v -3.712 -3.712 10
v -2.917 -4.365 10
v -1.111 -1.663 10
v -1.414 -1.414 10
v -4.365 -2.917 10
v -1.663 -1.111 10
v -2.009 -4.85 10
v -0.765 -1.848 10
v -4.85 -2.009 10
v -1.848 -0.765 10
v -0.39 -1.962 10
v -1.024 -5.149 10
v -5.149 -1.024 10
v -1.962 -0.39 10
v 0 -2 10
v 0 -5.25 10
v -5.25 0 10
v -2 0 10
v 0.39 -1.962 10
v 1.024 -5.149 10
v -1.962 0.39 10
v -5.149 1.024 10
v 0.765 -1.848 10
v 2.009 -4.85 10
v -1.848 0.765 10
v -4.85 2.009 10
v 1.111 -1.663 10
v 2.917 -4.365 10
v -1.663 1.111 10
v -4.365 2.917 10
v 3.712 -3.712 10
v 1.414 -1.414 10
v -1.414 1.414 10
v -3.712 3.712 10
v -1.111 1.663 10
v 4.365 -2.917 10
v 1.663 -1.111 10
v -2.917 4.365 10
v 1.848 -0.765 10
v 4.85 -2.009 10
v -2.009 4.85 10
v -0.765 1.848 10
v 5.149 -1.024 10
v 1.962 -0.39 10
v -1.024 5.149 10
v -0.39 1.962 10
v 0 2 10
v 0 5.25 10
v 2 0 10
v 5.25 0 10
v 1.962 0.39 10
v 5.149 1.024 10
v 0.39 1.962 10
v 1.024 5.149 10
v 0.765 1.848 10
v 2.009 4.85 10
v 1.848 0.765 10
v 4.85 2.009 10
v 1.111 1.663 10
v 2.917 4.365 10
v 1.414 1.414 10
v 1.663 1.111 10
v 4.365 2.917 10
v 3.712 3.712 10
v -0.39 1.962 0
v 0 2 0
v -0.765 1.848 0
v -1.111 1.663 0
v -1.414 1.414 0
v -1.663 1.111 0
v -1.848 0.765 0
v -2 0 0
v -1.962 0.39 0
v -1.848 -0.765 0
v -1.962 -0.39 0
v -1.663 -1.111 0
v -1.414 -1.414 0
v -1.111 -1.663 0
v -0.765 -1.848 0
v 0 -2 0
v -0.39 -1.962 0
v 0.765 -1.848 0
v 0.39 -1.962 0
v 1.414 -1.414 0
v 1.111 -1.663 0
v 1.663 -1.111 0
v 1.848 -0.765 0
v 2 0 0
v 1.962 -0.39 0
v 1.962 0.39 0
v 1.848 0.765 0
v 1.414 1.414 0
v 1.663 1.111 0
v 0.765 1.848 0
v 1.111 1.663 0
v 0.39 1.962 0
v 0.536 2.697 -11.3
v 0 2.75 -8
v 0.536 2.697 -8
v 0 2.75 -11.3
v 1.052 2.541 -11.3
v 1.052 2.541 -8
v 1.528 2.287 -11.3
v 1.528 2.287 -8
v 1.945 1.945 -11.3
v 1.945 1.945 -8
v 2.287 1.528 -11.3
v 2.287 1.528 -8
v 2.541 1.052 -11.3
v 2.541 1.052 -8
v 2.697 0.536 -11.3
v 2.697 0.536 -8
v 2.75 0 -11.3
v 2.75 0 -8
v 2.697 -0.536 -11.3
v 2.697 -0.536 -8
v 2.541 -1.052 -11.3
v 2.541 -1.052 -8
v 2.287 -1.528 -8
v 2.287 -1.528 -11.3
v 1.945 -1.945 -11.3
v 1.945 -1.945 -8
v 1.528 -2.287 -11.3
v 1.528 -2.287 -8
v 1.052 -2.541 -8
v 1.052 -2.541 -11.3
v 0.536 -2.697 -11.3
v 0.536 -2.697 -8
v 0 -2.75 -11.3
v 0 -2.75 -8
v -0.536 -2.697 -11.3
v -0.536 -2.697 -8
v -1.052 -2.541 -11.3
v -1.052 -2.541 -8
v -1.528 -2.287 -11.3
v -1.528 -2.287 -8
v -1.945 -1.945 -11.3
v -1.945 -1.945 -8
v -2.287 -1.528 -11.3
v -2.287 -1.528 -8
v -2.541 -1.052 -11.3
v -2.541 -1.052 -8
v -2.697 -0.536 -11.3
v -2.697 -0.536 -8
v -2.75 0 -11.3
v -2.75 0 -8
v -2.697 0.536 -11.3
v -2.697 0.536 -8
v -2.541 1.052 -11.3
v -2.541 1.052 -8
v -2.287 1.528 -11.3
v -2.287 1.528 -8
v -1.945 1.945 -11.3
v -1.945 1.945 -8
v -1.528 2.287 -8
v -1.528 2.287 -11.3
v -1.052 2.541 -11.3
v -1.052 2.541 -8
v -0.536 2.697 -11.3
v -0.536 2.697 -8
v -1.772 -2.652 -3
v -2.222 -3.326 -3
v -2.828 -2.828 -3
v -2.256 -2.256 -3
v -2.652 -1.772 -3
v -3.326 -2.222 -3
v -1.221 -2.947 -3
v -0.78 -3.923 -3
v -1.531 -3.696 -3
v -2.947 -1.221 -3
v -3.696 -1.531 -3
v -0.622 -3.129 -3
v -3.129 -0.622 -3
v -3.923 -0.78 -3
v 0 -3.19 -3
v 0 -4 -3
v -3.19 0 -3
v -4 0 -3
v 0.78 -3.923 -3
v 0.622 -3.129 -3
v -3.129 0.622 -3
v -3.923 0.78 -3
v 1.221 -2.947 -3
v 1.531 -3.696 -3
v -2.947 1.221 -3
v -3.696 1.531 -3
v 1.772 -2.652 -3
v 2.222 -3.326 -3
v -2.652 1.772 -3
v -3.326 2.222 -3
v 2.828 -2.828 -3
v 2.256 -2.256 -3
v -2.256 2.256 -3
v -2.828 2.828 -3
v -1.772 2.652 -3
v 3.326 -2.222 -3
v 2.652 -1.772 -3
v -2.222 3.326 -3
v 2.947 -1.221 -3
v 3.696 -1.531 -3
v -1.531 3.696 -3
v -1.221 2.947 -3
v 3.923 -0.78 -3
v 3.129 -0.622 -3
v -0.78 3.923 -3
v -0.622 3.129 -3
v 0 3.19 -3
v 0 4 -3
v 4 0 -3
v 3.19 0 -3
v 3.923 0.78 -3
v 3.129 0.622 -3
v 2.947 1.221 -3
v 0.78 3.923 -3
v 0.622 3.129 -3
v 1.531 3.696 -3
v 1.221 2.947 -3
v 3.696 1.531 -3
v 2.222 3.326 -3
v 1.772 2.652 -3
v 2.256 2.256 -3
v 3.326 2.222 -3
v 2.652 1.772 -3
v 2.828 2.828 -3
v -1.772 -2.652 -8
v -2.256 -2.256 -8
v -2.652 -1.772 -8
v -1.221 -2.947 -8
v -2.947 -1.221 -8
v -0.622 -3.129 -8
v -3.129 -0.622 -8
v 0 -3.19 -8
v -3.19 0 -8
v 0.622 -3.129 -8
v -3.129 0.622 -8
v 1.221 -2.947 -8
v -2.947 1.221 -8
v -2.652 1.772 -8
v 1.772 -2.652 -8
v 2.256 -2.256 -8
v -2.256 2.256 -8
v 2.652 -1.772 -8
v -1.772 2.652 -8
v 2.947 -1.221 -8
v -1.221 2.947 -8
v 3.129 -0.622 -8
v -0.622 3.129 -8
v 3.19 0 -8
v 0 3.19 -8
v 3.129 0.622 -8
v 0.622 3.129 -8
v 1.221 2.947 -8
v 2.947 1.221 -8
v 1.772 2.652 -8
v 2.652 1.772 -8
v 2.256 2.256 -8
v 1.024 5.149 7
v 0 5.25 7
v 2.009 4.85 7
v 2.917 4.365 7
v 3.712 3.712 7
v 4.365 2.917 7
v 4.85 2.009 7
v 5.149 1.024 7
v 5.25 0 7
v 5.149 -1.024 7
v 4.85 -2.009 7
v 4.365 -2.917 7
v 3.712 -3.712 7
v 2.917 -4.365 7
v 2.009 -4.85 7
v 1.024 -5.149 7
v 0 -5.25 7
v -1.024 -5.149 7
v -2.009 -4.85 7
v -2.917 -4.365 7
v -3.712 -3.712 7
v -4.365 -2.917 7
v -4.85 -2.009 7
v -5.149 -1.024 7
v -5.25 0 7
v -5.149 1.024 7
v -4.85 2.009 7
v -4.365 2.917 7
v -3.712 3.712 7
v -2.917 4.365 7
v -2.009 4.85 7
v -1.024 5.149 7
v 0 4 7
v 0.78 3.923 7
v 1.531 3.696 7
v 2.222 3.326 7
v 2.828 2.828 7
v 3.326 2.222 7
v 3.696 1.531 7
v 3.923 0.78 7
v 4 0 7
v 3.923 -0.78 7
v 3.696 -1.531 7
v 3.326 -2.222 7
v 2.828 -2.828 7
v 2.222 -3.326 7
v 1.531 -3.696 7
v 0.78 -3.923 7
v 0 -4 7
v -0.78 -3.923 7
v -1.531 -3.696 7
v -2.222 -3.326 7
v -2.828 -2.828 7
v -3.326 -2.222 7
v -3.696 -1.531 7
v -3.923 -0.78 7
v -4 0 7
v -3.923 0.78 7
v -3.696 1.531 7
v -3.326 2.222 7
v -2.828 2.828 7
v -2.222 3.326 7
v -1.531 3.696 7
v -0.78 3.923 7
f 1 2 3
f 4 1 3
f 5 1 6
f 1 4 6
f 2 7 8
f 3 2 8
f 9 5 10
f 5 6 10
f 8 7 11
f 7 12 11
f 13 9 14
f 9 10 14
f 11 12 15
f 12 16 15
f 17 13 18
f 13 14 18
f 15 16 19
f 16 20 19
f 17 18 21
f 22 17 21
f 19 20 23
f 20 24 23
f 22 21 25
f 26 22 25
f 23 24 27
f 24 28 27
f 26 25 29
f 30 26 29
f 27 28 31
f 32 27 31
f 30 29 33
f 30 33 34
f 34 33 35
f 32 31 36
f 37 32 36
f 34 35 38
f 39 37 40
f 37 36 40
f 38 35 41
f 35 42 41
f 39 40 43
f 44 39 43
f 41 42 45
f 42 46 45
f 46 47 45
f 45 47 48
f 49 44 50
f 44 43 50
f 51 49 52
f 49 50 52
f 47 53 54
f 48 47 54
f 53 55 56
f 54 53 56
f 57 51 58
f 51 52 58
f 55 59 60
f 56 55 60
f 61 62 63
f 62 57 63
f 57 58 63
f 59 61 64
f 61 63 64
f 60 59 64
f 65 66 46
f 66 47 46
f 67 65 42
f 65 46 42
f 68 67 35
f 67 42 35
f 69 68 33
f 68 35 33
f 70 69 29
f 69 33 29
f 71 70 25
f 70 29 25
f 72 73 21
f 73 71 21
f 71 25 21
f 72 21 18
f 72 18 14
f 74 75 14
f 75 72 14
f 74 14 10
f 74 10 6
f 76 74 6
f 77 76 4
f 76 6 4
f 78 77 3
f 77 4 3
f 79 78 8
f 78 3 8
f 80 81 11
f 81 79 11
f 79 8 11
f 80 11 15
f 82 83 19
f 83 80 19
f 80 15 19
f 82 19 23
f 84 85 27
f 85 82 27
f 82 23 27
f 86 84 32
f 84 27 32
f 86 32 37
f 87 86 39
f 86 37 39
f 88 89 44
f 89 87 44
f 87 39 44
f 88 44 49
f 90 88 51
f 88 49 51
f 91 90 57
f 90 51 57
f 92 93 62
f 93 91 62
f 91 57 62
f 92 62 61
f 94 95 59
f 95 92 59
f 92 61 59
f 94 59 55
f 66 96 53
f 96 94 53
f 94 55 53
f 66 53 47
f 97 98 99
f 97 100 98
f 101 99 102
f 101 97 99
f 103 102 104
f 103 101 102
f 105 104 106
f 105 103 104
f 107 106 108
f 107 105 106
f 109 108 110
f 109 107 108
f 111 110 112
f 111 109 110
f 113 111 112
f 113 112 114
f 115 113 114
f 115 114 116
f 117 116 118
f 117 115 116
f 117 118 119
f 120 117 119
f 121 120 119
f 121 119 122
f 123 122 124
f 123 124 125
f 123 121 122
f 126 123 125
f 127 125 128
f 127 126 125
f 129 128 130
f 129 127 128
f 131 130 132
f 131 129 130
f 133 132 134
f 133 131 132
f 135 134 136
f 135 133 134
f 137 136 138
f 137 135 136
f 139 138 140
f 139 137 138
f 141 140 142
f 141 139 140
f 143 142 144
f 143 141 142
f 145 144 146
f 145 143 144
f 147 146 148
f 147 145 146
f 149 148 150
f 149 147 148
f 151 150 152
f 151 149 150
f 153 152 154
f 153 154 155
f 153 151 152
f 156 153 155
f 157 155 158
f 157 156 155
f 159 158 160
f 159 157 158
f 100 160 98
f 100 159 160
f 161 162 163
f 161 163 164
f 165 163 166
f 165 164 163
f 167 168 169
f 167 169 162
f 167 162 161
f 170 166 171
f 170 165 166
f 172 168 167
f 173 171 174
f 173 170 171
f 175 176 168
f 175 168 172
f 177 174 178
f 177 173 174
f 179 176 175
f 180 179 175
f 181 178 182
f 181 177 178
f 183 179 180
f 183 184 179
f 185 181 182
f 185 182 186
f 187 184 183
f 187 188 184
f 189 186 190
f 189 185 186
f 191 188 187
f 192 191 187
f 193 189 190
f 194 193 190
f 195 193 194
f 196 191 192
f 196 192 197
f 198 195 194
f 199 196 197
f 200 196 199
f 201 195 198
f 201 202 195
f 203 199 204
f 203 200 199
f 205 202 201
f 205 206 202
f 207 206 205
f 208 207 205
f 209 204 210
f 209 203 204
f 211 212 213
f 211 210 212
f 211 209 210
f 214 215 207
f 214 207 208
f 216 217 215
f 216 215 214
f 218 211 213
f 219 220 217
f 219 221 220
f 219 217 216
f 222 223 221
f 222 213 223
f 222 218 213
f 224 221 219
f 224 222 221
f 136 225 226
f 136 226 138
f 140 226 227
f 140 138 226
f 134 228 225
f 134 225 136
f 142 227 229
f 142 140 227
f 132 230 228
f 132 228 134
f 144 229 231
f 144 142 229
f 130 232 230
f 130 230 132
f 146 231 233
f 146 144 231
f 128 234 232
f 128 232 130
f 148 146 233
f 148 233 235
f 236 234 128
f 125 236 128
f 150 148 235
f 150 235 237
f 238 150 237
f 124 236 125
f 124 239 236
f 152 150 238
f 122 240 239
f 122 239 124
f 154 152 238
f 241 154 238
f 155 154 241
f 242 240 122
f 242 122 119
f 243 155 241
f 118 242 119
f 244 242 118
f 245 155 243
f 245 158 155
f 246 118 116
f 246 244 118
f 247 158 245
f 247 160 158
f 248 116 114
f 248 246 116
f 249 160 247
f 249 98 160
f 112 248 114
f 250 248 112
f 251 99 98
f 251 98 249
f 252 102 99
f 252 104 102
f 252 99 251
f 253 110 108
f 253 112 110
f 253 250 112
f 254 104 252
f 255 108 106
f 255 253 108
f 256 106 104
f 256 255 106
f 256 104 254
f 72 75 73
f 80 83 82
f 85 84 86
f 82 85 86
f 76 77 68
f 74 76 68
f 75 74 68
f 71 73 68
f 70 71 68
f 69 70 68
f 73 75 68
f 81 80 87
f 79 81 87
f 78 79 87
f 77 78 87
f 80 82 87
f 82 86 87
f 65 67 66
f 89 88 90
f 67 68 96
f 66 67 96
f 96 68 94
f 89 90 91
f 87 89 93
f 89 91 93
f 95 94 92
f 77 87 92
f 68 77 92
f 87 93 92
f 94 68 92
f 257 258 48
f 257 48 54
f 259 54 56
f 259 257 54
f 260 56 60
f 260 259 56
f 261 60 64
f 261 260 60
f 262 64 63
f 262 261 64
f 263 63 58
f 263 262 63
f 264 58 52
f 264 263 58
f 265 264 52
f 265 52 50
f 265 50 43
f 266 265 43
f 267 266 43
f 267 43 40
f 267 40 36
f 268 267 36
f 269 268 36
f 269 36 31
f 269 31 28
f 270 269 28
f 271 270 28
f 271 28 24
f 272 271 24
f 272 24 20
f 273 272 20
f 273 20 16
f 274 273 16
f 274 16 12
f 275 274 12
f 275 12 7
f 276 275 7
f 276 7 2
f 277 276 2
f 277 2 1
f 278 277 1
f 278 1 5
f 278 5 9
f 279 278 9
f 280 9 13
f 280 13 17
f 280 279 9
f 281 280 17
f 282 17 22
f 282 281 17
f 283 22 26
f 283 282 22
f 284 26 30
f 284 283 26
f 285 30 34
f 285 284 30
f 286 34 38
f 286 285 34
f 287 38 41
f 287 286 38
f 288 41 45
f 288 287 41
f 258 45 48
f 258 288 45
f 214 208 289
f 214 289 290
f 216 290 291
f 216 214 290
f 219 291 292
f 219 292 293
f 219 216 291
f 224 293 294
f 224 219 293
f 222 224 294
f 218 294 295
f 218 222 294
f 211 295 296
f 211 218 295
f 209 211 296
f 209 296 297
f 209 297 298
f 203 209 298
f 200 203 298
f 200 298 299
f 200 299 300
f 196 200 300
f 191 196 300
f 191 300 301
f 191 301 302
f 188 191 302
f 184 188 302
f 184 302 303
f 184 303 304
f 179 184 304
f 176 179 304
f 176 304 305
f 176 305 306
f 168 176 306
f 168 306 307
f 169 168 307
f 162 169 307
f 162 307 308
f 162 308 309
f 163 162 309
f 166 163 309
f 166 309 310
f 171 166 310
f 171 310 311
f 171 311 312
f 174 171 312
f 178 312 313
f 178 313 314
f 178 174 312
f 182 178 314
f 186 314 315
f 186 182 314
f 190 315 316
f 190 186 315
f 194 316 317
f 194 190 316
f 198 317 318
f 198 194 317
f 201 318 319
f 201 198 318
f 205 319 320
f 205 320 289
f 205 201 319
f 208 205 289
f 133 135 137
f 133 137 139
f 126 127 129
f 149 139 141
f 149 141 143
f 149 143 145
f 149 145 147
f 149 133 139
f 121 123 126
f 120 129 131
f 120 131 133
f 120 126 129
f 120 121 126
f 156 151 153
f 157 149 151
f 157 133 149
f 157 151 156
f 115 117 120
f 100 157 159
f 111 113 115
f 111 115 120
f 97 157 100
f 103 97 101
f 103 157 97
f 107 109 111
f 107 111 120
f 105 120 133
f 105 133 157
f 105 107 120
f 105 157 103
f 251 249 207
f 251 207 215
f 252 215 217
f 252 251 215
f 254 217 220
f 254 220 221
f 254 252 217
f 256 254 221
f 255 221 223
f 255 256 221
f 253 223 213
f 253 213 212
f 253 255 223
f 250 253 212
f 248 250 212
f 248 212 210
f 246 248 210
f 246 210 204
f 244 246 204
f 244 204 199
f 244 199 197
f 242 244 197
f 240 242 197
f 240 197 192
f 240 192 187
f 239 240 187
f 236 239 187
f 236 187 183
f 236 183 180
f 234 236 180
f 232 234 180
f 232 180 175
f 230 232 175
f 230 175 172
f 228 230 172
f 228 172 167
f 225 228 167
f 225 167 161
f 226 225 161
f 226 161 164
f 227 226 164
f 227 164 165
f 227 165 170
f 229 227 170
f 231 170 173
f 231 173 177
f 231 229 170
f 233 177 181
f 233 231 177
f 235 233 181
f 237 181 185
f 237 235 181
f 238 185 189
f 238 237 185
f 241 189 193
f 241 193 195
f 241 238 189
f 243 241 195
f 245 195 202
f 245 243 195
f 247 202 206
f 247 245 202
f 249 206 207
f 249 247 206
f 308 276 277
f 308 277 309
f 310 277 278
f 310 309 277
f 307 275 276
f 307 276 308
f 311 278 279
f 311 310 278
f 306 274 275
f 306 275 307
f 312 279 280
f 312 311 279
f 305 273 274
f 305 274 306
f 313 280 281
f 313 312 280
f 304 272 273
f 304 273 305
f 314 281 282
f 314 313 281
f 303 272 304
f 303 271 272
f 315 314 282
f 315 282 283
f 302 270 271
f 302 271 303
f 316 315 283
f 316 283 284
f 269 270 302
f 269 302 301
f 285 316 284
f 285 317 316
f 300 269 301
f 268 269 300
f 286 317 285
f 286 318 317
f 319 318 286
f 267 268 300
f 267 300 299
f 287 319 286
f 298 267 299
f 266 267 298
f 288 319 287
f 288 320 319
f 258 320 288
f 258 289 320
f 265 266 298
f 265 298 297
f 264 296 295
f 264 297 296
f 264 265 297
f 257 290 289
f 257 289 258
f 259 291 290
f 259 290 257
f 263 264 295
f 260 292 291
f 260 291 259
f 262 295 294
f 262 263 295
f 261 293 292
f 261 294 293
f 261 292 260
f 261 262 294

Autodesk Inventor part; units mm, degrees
ref_plane "YZ Plane" through (0, 0, 0) normal (1, 0, 0) x (0, 1, 0)
ref_plane "XZ Plane" through (0, 0, 0) normal (0, 1, 0) x (-1, 0, 0)
ref_plane "XY Plane" through (0, 0, 0) normal (0, 0, 1) x (1, 0, 0)
sketch "Sketch1" plane through (0, 0, 0) normal (1, 0, 0) x (0, 1, 0)
  line L0 (0, 12.6765) -> (0, -12.6765)
  line L1 (0, 0) -> (2, 0)
  line L2 (2, 0) -> (2, 10)
  line L3 (2, 10) -> (5.25, 10)
  line L4 (5.25, 10) -> (5.25, 7)
  line L5 (5.25, 7) -> (4, 7)
  line L6 (4, 7) -> (4, -3)
  line L7 (4, -3) -> (3.19, -3)
  line L8 (3.19, -3) -> (3.19, -8)
  line L9 (3.19, -8) -> (2.75, -8)
  line L10 (2.75, -8) -> (2.75, -11.3)
  line L11 (2.75, -11.3) -> (0, -11.3)
  line L12 (0, -11.3) -> (0, 0)
  line L13 (2.75, -18.5) -> (0, -18.5) construction
  point P0 (2, 5)
  dimension "d0" = 4
  dimension "d1" = 3
  dimension "d2" = 10
  dimension "d3" = 10.5
  dimension "d4" = 8
  dimension "d5" = 6.38
  dimension "d6" = 5.5
  dimension "d7" = 28.5
  dimension "d8" = 10.5
  dimension "d9" = 21.3
  dimension "d10" = 13
revolve "Revolution1" add sketch "Sketch1" angle 360 about axis through (0, 0, 12.6765) along (0, 0, -1)
properties part number "A-2.103-B"
